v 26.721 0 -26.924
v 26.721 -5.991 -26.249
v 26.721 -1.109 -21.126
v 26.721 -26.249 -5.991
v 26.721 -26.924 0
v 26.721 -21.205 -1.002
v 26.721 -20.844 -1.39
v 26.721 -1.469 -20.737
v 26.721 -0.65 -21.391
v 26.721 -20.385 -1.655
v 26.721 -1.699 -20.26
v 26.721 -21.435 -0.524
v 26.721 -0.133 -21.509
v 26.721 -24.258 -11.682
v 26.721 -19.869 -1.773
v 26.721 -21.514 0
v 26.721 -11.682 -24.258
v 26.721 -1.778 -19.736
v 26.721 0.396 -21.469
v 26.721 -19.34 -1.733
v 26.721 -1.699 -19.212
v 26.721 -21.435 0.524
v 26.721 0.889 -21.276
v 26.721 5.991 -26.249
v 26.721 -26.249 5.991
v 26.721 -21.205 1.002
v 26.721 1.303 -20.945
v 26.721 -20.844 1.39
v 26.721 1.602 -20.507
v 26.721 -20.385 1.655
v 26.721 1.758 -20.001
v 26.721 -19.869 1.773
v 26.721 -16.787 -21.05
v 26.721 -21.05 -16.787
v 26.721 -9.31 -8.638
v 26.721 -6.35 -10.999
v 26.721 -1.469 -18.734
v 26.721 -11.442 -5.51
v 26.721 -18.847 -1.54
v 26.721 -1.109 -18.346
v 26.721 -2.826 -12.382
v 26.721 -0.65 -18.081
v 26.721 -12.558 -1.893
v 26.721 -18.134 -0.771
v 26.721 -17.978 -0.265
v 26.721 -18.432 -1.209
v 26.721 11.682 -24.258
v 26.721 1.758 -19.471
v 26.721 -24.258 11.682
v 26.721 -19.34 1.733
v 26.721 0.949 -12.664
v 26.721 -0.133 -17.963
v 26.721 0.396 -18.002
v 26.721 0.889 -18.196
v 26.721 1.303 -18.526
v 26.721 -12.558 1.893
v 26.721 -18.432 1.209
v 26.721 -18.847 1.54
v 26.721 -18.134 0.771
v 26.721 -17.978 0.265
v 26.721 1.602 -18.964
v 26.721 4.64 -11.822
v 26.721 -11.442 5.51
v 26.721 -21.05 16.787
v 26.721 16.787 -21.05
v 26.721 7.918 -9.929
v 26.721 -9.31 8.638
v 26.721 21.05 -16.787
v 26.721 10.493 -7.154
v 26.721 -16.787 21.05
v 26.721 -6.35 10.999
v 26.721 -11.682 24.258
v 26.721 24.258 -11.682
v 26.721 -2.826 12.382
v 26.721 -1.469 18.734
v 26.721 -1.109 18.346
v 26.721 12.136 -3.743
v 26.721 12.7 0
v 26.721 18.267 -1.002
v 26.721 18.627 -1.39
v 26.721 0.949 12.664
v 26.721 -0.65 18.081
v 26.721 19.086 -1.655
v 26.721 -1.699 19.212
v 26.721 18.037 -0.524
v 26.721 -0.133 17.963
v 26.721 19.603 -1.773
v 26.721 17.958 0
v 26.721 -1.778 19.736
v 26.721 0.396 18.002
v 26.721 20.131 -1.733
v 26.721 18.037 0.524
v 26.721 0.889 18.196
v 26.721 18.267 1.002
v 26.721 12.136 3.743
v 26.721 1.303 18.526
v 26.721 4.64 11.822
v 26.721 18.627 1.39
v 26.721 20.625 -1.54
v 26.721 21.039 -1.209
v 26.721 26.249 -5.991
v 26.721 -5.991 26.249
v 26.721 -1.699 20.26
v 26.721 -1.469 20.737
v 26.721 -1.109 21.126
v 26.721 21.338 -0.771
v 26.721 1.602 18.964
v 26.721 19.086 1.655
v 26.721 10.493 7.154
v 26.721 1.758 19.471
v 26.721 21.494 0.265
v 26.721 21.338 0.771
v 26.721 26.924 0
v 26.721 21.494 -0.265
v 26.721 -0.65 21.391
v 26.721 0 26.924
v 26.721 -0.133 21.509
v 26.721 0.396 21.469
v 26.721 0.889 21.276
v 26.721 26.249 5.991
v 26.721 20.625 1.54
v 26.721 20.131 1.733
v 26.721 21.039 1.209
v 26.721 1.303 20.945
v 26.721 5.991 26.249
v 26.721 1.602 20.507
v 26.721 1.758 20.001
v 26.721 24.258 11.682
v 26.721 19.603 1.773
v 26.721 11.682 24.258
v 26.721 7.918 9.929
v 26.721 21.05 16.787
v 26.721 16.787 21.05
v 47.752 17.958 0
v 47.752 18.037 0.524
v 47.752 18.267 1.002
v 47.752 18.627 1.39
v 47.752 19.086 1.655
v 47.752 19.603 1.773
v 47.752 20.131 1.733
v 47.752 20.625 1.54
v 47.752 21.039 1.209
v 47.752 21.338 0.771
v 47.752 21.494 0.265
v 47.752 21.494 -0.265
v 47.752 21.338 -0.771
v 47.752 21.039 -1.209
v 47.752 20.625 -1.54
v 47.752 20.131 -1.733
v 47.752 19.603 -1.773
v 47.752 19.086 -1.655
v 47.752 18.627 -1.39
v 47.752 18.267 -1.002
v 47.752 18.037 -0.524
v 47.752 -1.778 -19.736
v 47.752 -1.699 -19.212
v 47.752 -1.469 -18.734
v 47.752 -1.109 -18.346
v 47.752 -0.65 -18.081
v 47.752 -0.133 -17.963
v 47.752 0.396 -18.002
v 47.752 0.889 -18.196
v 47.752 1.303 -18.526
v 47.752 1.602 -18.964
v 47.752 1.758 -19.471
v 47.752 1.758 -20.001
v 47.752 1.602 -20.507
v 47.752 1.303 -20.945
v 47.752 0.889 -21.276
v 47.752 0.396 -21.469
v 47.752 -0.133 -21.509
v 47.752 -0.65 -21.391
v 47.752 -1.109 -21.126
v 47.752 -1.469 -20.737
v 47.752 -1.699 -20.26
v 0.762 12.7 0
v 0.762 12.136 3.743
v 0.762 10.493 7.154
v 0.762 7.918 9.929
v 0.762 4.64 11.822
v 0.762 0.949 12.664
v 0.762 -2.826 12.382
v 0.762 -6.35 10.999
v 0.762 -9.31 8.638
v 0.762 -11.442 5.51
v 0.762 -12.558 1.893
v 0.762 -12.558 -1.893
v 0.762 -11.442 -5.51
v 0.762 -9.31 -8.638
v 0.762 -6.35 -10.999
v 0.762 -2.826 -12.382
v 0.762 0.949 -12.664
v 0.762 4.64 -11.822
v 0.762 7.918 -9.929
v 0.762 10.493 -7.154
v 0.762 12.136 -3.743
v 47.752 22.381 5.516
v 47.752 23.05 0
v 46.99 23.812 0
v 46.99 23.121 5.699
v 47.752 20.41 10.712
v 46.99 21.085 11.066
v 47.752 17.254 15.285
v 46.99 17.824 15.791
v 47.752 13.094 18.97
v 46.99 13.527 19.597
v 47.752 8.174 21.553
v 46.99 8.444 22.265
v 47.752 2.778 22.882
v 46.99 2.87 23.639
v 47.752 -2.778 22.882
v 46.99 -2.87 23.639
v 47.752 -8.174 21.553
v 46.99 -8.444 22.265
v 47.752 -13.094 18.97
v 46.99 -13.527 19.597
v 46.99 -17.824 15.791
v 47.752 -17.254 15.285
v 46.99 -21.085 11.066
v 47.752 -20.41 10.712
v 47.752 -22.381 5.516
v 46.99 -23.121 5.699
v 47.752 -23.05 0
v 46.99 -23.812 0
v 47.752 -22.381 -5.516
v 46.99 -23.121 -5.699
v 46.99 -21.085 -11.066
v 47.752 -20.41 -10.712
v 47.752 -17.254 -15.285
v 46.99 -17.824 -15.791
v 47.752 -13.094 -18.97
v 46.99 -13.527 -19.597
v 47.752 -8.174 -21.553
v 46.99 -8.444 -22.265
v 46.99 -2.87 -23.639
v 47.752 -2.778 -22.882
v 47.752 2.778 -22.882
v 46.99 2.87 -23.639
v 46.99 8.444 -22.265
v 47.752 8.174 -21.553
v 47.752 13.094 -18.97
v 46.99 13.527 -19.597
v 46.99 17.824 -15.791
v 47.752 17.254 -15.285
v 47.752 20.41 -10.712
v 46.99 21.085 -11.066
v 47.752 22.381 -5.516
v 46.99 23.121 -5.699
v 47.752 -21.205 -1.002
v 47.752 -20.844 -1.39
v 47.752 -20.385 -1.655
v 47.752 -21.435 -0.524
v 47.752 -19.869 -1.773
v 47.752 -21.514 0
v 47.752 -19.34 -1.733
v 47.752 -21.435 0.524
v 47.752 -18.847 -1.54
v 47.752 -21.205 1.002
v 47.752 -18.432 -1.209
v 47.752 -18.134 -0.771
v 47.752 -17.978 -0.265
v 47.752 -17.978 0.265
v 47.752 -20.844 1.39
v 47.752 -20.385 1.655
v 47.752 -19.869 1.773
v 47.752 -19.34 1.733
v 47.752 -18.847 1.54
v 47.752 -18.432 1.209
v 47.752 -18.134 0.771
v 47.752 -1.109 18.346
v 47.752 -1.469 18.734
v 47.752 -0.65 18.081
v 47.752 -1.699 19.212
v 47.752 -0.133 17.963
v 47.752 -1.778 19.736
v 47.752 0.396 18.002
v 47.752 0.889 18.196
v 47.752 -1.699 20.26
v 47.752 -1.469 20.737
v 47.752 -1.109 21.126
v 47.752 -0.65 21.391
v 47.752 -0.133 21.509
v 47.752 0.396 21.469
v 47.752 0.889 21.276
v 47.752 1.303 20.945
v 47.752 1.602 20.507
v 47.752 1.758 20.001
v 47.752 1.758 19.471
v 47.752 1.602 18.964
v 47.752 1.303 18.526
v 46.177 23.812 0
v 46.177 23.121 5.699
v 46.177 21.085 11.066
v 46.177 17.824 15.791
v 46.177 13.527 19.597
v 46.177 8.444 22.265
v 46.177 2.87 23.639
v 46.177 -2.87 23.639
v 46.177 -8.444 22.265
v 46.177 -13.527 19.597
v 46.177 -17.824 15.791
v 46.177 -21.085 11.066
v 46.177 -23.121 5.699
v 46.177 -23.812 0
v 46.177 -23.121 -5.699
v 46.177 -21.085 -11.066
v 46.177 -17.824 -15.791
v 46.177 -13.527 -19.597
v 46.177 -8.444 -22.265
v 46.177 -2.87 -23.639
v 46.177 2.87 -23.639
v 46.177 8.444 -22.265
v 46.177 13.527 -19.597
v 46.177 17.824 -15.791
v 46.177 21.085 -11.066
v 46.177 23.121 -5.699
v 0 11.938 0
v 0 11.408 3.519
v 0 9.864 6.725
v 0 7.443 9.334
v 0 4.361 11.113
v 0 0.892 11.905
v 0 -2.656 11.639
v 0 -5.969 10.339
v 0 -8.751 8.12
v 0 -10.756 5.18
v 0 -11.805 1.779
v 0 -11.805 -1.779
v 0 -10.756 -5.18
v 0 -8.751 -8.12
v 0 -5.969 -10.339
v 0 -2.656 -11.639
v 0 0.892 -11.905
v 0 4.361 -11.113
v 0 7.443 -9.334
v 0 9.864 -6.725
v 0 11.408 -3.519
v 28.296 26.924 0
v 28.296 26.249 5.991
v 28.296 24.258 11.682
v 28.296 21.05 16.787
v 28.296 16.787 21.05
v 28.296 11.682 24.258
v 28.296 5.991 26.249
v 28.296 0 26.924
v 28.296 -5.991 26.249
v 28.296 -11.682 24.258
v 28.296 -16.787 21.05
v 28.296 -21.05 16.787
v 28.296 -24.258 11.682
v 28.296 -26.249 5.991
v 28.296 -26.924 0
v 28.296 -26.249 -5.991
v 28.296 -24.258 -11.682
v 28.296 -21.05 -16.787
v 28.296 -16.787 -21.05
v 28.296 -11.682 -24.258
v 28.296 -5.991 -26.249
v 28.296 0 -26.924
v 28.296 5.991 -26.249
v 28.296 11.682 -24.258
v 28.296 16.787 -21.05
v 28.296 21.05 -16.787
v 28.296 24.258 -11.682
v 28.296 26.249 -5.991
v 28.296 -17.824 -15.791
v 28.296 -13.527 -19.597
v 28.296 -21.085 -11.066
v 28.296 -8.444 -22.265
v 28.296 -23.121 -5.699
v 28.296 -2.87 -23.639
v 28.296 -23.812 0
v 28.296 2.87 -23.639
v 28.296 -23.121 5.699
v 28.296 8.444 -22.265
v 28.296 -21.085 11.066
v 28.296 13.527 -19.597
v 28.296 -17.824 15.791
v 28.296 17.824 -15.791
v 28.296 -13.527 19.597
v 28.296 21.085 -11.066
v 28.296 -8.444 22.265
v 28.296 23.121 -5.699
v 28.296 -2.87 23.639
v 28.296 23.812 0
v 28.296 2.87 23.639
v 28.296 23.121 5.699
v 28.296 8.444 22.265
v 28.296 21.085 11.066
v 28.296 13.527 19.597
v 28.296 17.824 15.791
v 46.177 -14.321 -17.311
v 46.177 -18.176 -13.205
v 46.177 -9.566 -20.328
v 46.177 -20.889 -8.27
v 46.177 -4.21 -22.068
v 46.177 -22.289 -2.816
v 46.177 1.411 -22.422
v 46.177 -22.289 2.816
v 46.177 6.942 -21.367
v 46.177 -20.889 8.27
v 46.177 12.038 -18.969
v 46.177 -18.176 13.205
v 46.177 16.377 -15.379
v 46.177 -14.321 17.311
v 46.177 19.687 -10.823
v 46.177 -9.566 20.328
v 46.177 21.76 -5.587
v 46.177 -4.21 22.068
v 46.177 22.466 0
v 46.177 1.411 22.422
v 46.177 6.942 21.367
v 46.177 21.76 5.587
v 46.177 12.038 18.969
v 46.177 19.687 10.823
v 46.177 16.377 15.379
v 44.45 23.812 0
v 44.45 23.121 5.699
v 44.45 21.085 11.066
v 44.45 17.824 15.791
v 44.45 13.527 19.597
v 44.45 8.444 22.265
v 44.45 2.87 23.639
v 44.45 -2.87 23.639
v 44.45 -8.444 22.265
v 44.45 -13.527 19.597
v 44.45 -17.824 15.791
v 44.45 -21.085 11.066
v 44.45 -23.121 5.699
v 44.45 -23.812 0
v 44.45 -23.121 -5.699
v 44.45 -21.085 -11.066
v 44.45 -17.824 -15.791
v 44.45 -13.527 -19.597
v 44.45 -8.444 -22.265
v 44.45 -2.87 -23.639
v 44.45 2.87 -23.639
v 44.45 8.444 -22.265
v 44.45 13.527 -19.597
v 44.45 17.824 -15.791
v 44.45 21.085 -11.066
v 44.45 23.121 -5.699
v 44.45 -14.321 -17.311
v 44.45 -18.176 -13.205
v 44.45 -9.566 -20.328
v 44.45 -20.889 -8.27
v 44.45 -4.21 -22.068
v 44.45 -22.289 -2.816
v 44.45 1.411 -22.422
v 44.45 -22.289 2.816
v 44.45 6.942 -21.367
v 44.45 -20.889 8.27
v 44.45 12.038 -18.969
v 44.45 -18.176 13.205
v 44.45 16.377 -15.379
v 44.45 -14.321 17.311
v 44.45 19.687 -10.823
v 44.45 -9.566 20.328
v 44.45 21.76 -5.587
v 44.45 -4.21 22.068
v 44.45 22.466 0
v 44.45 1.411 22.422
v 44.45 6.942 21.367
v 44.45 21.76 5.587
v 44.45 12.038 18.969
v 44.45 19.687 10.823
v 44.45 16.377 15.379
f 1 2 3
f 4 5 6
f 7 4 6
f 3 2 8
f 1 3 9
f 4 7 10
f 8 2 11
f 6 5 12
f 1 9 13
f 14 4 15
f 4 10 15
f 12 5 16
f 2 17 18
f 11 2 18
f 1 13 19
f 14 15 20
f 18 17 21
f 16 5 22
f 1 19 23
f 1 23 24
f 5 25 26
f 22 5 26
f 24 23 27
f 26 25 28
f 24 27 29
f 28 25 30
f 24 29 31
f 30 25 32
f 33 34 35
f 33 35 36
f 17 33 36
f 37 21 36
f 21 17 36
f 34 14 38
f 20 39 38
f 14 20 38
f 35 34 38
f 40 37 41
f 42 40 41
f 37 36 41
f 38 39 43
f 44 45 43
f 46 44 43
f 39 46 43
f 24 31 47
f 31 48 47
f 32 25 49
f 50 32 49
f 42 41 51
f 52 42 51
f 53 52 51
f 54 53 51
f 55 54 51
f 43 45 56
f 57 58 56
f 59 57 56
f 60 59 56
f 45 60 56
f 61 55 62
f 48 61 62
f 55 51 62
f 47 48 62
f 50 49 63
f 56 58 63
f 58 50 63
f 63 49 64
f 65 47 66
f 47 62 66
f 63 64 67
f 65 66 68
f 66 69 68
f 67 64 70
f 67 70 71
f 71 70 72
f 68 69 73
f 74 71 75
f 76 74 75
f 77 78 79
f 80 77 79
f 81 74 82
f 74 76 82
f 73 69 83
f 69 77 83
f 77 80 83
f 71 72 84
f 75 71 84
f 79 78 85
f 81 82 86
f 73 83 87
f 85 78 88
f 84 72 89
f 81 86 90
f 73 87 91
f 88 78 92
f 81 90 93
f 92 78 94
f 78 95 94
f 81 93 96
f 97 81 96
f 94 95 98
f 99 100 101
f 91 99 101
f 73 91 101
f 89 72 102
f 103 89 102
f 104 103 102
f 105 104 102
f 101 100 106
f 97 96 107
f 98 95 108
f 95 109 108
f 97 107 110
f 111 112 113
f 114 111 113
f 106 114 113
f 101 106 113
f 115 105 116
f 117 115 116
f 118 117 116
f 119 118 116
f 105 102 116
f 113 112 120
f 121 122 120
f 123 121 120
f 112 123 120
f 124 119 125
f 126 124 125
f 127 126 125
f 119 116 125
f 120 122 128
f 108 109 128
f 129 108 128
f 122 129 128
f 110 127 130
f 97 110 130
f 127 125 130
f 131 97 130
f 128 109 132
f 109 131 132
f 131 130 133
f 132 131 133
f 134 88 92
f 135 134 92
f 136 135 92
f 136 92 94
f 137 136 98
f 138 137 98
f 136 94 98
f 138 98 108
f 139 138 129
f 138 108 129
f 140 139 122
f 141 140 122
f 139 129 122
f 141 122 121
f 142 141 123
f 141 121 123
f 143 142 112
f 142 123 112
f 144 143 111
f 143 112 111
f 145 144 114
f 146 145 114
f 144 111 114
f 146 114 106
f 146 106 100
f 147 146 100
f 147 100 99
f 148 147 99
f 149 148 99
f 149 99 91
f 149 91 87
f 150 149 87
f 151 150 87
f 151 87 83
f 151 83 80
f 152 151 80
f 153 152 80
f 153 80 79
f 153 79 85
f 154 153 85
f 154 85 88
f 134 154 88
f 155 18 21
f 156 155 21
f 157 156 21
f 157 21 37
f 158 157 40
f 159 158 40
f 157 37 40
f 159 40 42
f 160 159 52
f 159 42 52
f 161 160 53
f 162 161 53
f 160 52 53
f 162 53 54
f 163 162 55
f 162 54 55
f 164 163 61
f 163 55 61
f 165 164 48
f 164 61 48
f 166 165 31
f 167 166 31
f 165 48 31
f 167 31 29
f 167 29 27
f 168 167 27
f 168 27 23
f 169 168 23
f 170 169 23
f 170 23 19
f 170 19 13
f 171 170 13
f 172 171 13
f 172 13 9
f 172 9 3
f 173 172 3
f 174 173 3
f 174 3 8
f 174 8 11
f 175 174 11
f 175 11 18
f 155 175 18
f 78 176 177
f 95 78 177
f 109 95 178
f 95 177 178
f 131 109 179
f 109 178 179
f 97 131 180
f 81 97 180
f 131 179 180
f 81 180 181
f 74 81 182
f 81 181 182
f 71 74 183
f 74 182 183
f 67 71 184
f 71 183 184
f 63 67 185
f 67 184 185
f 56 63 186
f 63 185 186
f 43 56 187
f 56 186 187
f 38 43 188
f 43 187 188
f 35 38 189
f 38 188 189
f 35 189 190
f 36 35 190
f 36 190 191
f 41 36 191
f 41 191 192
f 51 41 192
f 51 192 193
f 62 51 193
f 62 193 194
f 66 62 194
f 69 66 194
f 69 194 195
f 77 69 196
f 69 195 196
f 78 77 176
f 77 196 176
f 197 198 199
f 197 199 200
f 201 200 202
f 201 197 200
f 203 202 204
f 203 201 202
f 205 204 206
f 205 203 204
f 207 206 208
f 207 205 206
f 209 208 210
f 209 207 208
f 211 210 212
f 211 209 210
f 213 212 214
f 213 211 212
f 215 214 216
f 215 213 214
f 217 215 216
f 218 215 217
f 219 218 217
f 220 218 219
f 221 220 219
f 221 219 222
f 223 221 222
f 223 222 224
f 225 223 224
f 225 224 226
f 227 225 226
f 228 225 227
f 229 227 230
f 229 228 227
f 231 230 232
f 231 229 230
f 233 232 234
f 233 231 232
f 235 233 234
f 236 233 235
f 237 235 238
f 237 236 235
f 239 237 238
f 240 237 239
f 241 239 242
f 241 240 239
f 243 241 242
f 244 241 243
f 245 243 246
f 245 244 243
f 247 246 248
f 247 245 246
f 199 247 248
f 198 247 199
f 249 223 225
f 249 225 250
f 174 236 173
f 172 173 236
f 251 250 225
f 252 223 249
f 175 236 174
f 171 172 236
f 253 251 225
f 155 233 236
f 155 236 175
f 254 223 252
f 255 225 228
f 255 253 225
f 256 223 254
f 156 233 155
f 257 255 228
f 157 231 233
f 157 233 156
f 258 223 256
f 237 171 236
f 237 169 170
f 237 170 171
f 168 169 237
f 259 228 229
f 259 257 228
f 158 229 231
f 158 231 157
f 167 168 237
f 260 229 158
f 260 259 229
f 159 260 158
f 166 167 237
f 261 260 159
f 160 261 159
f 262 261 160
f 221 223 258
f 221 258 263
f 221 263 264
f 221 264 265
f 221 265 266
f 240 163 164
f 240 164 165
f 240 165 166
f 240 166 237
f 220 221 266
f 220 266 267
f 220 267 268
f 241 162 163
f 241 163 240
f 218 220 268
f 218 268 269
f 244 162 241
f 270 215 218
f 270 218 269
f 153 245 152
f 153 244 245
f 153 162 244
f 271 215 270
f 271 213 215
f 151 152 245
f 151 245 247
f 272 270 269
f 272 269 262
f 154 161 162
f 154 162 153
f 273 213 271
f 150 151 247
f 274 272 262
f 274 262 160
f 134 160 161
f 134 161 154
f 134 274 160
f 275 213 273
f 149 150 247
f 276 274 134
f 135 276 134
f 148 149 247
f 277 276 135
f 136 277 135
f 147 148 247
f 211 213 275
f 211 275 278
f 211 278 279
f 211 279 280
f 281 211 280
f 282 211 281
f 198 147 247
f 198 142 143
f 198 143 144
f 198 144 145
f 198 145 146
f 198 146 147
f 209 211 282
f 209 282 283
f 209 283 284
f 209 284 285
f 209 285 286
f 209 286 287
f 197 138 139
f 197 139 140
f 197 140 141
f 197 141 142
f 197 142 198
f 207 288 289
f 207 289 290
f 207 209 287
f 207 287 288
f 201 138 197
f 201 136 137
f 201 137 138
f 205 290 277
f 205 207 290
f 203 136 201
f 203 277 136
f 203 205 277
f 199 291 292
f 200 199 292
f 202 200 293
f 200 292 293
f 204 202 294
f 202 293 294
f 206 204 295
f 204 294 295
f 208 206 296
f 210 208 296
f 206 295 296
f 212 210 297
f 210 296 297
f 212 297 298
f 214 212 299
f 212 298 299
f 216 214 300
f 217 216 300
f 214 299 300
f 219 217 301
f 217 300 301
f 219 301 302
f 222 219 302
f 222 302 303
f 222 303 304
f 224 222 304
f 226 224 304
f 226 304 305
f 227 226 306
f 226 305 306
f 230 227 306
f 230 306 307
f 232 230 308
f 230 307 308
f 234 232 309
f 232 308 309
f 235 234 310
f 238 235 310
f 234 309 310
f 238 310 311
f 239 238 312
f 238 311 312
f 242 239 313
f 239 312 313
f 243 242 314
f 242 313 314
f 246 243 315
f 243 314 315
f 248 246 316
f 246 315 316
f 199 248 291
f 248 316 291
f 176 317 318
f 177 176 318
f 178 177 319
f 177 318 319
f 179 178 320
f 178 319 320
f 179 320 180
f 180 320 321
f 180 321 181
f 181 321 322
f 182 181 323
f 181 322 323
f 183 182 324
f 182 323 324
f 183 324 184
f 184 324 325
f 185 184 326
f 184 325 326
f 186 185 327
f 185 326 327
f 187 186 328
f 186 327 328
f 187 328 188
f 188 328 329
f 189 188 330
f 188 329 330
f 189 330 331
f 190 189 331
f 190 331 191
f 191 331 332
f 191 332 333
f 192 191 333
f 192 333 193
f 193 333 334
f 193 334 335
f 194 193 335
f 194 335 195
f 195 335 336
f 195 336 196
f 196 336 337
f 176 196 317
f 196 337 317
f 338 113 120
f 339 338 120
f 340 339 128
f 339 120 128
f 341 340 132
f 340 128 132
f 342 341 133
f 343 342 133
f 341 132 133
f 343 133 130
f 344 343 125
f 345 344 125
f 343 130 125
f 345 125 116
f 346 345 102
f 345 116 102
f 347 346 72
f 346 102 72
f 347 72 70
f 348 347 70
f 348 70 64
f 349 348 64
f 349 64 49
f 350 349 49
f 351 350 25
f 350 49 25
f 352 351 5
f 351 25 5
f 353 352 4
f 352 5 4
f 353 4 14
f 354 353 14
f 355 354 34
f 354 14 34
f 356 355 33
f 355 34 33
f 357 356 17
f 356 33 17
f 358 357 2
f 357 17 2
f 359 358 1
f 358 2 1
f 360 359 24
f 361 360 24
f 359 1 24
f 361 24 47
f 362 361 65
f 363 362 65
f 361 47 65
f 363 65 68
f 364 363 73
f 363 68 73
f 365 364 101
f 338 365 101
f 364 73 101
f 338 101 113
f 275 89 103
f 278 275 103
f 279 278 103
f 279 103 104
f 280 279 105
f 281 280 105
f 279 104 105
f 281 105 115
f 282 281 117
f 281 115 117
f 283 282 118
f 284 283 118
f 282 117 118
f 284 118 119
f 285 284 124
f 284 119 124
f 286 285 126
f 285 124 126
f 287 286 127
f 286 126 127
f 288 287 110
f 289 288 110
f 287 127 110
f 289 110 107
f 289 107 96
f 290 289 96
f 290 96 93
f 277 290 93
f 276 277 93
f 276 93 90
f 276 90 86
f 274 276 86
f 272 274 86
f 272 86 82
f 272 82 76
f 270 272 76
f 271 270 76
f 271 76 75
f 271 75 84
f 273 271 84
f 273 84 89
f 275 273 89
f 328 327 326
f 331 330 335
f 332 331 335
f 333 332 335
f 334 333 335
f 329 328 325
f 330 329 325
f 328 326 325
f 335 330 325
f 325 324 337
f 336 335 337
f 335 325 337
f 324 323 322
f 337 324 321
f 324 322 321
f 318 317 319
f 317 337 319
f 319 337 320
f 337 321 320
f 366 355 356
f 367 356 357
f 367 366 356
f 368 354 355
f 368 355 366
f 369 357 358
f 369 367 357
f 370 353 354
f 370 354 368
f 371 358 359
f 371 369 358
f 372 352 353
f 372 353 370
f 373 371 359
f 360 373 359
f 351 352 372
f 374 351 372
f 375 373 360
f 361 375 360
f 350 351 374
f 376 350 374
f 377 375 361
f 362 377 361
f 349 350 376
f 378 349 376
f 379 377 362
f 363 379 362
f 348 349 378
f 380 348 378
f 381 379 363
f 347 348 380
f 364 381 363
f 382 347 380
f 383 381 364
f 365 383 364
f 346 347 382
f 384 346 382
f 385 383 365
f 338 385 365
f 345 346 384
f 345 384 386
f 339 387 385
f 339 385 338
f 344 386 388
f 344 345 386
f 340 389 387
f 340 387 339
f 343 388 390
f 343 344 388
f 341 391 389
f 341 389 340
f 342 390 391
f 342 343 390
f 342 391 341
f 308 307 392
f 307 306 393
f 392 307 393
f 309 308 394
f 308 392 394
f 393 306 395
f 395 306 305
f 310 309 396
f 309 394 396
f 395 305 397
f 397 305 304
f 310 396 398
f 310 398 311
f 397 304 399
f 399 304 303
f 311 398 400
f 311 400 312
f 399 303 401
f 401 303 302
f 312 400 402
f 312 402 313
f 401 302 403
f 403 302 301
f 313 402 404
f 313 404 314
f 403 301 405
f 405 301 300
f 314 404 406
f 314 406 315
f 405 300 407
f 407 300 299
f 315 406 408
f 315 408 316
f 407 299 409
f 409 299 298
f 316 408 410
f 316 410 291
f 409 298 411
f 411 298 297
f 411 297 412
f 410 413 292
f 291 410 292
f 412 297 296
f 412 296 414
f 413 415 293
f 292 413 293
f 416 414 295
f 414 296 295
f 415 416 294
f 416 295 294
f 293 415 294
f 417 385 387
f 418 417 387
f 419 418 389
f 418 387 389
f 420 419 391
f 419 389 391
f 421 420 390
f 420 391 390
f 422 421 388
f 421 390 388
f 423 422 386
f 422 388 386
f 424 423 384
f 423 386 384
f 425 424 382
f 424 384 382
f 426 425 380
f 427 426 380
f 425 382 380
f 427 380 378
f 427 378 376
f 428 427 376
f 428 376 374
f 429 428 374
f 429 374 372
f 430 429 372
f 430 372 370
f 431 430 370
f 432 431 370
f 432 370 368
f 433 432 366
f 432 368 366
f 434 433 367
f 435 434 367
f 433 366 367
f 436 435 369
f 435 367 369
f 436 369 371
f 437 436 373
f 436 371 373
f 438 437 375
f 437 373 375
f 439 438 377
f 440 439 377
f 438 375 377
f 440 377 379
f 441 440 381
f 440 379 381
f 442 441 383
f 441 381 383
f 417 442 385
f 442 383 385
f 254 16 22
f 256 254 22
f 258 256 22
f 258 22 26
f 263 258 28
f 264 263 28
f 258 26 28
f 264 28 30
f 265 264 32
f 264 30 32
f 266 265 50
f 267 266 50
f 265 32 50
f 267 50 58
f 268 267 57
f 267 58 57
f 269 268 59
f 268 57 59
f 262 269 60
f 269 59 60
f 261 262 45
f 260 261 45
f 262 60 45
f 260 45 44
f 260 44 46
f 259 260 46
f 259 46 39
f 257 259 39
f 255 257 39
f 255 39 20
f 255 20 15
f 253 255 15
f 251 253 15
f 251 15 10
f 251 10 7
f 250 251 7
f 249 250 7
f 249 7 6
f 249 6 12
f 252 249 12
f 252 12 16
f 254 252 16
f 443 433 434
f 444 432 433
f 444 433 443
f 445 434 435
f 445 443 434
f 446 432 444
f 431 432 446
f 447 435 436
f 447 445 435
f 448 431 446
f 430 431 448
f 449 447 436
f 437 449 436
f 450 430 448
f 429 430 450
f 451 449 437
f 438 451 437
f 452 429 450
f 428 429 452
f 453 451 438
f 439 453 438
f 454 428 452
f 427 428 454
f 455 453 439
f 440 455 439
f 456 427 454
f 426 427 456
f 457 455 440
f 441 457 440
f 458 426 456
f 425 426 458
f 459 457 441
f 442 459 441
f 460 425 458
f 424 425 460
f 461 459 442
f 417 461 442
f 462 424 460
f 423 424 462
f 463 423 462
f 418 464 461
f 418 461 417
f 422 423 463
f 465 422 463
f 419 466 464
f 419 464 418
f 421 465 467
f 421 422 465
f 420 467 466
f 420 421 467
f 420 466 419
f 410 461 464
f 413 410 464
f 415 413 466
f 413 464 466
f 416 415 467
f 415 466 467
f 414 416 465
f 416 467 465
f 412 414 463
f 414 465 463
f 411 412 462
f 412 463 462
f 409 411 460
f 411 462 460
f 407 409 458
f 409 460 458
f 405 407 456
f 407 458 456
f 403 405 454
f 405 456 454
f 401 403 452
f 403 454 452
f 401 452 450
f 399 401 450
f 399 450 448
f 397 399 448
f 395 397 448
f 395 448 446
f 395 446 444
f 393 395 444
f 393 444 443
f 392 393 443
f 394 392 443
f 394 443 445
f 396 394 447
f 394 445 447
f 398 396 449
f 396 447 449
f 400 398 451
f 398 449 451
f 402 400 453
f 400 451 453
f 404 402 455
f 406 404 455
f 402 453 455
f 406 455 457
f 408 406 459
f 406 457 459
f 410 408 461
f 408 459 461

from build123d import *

# Parameters (mm, degrees)
F0_R      = 12.7
F1_DEPTH  = 26.7208
F2_R      = 26.924
F2_R_2    = 12.7
F3_DEPTH  = 1.5748
F4_R      = 23.8125
F5_DEPTH  = 16.1544
F6_R      = 22.4663
F7_DEPTH  = 1.7272
F8_R      = 23.8125
F9_DEPTH  = 1.5748
F10_SIZE  = 0.762
F11_SIZE  = 0.762
F12_R     = 1.778
F13_DEPTH = 21.0322


with BuildPart() as f1:
    # F0 (on Right) → F1 (new body)
    with BuildSketch(Plane.YZ):
        Circle(F0_R)
    extrude(amount=F1_DEPTH)

    # F2 (on face) → F3 (join)
    with BuildSketch(Plane.YZ.offset(26.7208)):
        Circle(F2_R)
        Circle(F2_R_2, mode=Mode.SUBTRACT)
        Circle(F2_R_2)
    extrude(amount=F3_DEPTH)

    # F4 (on face) → F5 (join)
    with BuildSketch(Plane.YZ.offset(28.2956)):
        Circle(F4_R)
    extrude(amount=F5_DEPTH)

    # F6 (on face) → F7 (join)
    with BuildSketch(Plane.YZ.offset(44.45)):
        Circle(F6_R)
    extrude(amount=F7_DEPTH)

    # F8 (on face) → F9 (join)
    with BuildSketch(Plane.YZ.offset(46.1772)):
        Circle(F8_R)
    extrude(amount=F9_DEPTH)

    # F10
    f10_edges = [f1.edges().sort_by_distance(p)[0] for p in [
        (47.752, -23.8125, 0),
    ]]
    chamfer(f10_edges, length=F10_SIZE)

    # F11
    f11_edges = [f1.edges().sort_by_distance(p)[0] for p in [
        (0, -12.7, 0),
    ]]
    chamfer(f11_edges, length=F11_SIZE)

    # F12 (on face) → F13 (cut, through all)
    with BuildSketch(Plane(origin=(26.7208, 0, 0), x_dir=(0, -1, 0), z_dir=(-1, 0, 0))):
        with Locations((0, 19.7358)):
            Circle(F12_R)
        with Locations((19.7358, 0)):
            Circle(F12_R)
        with Locations((0, -19.7358)):
            Circle(F12_R)
        with Locations((-19.7358, 0)):
            Circle(F12_R)
    extrude(amount=-F13_DEPTH, mode=Mode.SUBTRACT)


solid = f1.part
